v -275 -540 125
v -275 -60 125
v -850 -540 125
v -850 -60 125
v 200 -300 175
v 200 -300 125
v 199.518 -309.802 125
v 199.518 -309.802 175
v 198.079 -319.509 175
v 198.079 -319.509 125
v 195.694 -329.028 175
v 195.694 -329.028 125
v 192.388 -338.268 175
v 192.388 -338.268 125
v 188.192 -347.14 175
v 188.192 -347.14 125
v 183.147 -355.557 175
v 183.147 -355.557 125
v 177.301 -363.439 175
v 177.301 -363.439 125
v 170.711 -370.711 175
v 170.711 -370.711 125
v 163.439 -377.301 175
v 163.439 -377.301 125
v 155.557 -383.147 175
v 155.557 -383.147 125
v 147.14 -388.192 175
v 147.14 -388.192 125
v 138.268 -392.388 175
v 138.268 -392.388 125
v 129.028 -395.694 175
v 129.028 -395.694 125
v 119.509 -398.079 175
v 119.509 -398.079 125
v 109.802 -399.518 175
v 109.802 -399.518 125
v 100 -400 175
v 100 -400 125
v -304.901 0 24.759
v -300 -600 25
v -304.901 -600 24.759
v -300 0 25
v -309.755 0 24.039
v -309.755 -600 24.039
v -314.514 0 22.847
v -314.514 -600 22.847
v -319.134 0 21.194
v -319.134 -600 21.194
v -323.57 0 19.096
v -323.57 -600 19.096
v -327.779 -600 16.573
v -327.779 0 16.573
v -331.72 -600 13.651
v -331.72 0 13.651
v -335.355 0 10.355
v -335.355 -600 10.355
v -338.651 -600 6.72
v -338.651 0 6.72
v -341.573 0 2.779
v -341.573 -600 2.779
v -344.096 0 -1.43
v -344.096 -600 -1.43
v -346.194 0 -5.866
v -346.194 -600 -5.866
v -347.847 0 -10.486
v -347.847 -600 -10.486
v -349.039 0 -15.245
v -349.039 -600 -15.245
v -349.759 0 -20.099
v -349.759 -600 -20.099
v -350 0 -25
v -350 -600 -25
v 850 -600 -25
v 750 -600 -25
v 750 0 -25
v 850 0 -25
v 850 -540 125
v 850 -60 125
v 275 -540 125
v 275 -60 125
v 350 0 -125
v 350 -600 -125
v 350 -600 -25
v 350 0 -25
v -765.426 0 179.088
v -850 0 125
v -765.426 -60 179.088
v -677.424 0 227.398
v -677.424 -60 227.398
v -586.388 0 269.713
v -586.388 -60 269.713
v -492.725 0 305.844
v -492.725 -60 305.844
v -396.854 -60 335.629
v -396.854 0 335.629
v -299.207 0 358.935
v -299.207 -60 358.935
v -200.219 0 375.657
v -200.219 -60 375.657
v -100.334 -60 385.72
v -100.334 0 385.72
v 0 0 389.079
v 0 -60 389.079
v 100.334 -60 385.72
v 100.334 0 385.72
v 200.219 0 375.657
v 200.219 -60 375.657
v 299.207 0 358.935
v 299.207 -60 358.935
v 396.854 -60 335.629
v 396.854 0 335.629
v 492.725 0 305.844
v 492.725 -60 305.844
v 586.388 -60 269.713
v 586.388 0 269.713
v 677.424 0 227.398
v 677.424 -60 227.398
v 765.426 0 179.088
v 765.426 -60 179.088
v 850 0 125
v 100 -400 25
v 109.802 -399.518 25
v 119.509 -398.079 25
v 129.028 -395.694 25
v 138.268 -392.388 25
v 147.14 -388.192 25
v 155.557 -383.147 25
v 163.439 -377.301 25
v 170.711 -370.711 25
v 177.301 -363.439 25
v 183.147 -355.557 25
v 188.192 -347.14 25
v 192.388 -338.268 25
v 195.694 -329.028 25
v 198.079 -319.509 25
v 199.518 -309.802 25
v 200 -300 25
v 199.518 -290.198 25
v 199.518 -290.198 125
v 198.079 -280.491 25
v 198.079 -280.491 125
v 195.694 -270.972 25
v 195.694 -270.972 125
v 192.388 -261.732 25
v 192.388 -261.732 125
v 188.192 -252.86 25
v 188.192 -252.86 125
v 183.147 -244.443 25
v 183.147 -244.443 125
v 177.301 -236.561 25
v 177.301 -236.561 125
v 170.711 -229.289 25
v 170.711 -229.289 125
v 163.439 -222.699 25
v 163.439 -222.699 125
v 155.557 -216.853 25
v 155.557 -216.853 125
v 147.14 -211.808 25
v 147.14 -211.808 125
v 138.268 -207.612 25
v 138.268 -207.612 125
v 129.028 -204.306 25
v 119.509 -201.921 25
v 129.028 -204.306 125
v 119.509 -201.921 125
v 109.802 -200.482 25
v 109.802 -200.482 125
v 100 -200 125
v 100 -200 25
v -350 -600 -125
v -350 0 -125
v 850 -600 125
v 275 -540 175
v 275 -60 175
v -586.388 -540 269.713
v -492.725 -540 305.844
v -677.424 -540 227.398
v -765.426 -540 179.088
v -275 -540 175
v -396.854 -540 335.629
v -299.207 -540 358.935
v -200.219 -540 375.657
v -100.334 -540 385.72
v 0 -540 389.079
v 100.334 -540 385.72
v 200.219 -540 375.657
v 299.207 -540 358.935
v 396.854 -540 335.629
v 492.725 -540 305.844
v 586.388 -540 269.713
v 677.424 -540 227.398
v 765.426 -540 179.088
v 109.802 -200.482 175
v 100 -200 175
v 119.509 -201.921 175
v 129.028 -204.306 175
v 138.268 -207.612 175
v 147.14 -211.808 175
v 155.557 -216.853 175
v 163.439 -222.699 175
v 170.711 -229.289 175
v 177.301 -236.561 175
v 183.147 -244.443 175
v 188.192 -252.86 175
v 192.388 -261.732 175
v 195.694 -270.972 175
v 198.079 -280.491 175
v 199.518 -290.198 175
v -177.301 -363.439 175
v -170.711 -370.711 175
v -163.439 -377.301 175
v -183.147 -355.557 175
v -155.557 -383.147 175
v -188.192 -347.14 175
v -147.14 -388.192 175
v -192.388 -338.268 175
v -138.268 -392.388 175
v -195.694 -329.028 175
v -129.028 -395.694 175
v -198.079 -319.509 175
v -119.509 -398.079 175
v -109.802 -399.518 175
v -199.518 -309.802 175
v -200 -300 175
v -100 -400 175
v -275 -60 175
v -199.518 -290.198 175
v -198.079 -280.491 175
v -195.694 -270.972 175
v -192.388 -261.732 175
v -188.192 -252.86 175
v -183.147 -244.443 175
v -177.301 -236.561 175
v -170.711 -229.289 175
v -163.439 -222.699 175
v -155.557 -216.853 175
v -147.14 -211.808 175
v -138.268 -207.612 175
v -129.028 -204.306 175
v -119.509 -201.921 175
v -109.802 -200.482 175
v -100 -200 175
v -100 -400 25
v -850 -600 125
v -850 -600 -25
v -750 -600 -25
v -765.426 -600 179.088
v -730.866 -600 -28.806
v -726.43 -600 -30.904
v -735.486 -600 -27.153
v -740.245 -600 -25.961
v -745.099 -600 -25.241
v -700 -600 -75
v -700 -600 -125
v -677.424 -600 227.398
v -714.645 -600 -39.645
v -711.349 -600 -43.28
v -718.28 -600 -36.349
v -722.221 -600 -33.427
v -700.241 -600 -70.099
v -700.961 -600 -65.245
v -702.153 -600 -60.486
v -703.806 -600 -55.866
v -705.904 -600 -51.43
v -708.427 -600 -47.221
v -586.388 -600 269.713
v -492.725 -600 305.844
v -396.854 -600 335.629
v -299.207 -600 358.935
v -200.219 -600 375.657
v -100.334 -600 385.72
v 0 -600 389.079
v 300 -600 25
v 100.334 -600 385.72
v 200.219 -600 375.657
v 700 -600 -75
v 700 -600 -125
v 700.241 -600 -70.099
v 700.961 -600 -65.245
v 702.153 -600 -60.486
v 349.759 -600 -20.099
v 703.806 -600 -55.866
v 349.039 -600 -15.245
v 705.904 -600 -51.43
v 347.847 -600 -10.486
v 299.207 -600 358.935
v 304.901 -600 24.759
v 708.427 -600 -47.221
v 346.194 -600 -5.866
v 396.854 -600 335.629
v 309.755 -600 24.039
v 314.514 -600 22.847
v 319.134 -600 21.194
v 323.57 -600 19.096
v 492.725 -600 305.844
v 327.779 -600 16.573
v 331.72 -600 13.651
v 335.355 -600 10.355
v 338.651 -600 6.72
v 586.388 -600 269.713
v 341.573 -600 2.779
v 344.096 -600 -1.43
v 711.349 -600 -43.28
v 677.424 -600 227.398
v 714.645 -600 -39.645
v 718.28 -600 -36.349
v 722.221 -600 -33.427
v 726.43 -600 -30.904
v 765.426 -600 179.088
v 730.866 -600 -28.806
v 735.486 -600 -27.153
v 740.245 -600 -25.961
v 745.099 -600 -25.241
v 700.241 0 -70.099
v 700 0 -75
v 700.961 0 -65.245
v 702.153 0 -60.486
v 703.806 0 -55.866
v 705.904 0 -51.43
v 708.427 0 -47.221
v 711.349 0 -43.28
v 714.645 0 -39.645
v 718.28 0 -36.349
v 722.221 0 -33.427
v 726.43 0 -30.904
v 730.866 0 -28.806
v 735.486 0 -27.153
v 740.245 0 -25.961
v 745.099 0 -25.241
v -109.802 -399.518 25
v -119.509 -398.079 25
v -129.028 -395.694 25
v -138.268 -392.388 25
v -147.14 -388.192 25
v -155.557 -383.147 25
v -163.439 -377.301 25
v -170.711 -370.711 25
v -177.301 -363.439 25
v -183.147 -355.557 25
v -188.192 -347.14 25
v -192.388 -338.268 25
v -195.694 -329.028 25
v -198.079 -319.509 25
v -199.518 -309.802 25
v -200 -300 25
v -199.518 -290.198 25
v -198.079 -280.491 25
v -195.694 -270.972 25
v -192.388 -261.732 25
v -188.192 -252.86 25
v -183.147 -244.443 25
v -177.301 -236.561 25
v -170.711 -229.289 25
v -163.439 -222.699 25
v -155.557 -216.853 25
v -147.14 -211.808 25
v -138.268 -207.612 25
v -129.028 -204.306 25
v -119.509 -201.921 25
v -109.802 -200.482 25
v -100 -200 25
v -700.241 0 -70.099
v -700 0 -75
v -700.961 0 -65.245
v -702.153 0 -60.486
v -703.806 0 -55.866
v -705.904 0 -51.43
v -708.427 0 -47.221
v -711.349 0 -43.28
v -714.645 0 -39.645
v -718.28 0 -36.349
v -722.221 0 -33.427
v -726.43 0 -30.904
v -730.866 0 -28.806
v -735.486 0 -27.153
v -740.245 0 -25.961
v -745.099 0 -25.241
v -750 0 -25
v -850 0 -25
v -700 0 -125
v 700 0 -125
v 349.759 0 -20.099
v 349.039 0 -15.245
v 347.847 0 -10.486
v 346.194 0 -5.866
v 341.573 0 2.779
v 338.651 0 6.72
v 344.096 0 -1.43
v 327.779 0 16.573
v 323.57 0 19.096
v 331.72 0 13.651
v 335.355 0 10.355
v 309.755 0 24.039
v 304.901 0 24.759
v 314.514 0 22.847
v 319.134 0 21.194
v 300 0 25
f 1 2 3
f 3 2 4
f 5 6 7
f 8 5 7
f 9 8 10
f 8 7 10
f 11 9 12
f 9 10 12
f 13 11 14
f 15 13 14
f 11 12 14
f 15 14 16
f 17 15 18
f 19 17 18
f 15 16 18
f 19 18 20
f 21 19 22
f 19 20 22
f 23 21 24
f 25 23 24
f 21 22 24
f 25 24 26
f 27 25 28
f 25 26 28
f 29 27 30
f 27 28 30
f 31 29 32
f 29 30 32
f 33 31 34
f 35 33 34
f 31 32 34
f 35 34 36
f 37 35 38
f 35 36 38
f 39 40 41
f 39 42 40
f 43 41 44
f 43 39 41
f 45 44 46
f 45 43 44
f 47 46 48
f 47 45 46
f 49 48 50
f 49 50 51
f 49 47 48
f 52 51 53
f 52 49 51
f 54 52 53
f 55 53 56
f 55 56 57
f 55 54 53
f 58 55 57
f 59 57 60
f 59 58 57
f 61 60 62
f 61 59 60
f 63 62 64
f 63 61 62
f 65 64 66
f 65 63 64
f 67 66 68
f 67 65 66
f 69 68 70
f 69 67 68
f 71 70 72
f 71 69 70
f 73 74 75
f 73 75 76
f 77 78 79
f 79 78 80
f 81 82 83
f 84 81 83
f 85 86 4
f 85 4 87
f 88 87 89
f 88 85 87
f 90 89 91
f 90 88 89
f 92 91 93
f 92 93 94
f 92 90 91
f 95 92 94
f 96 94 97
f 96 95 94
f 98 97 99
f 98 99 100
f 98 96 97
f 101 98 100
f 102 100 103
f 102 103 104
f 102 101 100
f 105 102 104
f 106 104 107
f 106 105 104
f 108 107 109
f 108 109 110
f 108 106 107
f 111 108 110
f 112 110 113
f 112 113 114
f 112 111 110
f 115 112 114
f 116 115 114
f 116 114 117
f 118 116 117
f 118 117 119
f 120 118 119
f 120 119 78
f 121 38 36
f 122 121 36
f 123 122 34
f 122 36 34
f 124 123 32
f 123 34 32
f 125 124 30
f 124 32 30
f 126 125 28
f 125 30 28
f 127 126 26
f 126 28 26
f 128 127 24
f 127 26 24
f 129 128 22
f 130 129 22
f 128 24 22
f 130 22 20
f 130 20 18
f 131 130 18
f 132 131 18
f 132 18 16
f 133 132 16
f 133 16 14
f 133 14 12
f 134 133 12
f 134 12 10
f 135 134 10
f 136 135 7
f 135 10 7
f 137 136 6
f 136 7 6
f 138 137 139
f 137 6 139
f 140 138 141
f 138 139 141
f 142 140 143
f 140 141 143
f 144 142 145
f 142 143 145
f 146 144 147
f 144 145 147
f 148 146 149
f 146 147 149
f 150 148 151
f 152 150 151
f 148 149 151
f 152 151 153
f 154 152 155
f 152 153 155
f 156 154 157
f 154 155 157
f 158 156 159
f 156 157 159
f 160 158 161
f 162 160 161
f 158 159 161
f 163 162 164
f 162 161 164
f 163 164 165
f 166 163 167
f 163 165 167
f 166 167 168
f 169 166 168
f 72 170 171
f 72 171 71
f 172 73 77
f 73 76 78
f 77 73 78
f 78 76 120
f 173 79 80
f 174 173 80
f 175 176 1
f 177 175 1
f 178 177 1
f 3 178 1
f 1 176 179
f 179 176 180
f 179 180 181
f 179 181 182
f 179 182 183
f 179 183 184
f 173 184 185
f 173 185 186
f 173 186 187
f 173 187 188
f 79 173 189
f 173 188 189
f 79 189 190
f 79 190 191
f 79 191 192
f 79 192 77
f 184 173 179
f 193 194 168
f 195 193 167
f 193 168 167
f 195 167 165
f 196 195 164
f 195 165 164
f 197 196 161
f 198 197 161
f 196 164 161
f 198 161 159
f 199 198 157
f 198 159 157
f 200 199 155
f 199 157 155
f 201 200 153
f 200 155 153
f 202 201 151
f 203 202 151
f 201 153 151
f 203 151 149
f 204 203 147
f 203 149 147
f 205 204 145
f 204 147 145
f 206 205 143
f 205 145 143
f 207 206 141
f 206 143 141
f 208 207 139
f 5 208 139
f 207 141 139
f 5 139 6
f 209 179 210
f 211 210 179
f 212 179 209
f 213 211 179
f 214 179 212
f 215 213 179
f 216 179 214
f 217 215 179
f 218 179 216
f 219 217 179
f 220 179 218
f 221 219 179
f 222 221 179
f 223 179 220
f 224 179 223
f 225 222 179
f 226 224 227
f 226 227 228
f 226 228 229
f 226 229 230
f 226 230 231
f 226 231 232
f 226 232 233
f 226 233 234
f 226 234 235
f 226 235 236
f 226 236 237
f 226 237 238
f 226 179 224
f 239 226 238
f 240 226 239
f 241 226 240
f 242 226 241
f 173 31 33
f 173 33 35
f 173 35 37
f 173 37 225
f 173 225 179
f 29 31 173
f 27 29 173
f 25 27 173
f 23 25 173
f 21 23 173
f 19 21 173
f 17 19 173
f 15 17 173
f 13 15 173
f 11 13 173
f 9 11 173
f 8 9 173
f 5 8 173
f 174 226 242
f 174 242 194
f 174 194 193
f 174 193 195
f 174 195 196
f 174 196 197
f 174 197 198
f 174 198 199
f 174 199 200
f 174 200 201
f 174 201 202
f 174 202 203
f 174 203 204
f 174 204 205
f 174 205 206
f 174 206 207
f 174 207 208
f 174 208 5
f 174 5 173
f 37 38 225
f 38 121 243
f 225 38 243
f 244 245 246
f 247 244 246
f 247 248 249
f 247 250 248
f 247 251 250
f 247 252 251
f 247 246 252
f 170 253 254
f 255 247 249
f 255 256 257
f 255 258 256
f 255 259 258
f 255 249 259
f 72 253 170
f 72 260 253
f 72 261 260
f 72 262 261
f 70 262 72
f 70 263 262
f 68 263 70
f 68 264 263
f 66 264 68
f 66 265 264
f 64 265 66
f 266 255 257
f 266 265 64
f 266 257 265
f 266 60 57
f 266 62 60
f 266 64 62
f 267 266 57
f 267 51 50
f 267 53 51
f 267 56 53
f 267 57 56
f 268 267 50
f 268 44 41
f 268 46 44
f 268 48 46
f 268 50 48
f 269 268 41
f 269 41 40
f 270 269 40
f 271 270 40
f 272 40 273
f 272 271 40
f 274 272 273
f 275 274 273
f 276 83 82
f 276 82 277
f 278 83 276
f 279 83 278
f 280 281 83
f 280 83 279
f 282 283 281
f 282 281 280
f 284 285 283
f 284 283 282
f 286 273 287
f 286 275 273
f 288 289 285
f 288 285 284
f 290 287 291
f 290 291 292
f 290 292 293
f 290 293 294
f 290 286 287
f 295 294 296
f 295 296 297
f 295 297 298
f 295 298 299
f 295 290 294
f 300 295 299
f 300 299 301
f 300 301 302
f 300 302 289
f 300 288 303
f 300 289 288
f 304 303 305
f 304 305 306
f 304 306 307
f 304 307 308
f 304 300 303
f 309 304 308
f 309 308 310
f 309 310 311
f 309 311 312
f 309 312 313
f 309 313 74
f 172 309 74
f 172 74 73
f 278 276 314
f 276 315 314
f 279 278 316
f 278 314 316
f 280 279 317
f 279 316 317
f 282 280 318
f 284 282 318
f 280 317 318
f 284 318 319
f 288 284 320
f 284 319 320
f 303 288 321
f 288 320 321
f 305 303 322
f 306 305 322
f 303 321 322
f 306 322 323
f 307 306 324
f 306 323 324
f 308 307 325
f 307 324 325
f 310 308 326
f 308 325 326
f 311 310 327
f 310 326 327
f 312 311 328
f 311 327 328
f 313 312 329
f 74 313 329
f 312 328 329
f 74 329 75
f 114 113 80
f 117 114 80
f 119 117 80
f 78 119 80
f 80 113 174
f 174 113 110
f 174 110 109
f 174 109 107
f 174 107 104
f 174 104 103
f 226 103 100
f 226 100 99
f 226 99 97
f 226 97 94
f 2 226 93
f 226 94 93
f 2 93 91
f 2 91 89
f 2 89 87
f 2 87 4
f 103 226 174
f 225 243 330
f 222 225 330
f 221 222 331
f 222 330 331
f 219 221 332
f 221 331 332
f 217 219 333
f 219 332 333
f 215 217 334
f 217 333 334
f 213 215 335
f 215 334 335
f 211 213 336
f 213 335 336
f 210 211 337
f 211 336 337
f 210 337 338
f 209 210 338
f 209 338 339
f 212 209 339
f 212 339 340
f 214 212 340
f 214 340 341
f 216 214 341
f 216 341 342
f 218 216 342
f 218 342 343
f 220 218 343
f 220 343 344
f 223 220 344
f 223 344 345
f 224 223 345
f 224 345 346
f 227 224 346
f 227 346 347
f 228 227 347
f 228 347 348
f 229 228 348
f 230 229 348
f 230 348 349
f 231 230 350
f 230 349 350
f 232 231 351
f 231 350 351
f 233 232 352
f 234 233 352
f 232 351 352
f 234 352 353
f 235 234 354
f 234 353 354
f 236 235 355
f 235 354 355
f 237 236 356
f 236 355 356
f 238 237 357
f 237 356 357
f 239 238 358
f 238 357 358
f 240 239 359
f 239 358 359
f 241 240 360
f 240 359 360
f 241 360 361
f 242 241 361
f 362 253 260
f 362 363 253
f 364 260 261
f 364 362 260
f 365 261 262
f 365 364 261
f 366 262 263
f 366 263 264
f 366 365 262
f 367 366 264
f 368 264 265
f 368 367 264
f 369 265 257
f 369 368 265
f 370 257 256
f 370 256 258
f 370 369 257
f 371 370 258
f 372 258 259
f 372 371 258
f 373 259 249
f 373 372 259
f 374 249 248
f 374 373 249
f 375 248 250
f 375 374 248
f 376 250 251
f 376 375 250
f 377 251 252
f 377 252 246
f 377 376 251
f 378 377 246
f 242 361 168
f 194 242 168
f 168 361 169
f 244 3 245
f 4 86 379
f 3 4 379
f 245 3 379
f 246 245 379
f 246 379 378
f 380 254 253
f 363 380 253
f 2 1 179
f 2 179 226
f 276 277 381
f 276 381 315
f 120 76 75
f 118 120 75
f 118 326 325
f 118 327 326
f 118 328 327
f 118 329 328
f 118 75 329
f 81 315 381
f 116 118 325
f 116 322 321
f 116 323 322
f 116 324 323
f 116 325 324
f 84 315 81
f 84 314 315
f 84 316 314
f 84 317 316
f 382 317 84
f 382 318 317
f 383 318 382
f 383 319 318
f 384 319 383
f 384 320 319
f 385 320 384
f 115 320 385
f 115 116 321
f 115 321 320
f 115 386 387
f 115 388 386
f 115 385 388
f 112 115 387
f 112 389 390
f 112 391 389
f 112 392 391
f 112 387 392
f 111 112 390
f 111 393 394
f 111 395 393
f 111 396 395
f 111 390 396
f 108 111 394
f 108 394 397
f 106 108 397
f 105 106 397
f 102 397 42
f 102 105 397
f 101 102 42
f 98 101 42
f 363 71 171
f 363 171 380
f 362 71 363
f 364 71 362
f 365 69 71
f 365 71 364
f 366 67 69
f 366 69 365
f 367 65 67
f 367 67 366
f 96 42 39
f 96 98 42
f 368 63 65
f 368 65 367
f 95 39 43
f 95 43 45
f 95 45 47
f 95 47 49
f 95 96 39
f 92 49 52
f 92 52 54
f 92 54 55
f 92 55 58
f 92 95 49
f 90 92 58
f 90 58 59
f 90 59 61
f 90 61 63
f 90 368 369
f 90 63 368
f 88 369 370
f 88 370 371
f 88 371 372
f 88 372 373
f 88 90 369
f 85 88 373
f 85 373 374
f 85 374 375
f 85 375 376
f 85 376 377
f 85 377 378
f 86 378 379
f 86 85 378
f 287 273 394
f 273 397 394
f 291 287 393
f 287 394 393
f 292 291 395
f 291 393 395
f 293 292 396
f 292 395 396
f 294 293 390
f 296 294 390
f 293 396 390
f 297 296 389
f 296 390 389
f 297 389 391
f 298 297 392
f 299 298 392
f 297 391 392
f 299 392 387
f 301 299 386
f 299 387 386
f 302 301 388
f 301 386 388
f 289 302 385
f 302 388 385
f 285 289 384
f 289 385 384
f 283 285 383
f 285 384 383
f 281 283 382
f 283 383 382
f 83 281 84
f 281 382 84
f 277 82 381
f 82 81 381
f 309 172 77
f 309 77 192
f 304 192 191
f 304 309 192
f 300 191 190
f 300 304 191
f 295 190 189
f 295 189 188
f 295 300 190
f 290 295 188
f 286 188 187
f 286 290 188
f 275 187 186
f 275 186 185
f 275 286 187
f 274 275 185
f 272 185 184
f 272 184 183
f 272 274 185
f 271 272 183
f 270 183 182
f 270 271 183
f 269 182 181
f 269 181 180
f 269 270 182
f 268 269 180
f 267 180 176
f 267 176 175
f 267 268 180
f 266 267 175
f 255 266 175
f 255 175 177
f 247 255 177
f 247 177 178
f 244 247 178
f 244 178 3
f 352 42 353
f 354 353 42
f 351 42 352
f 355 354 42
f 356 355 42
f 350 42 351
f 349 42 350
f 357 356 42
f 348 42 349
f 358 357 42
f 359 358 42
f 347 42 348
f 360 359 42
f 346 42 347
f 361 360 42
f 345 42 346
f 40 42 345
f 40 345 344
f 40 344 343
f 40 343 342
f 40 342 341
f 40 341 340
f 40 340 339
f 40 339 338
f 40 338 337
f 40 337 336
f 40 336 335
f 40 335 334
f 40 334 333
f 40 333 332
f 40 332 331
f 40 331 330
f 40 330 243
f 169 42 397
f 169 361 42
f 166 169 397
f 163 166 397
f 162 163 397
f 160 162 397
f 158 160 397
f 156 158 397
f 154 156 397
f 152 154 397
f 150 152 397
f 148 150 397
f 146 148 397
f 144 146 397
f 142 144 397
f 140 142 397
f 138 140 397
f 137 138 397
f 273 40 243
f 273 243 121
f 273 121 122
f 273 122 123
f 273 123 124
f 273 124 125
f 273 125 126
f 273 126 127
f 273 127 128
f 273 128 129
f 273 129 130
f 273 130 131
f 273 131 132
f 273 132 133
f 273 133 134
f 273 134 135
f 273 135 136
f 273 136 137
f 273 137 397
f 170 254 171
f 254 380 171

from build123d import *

# Parameters (mm, degrees)
F0_W      = 150
F0_H      = 100
F1_DEPTH  = 600
F2_W      = 150
F2_H      = 100
F3_DEPTH  = 600.001
F4_W      = 150
F4_H      = 100
F5_DEPTH  = 600.001
F6_R      = 50
F7_R      = 50
F9_DEPTH  = 60
F11_DEPTH = 60
F12_W     = 700
F12_H     = 300
F13_DEPTH = 600.001
F14_R     = 50
F15_R     = 50
F16_W     = 550
F16_H     = 480
F17_DEPTH = 50
F18_DEPTH = 25
F19_DEPTH = 250.001


with BuildPart() as f1:
    # F0 (on Front) → F1 (new body)
    with BuildSketch(Plane.XZ):
        with Locations((-775, -75)):
            Rectangle(F0_W, F0_H)
        Polygon((-700, -25), (-700, -125), (850, -125), (850, 125), (-850, 125), (-850, -25), align=None)
    extrude(amount=F1_DEPTH)

    # F2 (on face) → F3 (cut, through all)
    with BuildSketch(Plane.XZ.offset(600)):
        with Locations((-775, -75)):
            Rectangle(F2_W, F2_H)
    extrude(amount=-F3_DEPTH, mode=Mode.SUBTRACT)

    # F4 (on face) → F5 (cut, through all)
    with BuildSketch(Plane.XZ.offset(600)):
        with Locations((775, -75)):
            Rectangle(F4_W, F4_H)
    extrude(amount=-F5_DEPTH, mode=Mode.SUBTRACT)

    # F6
    f6_edges = [f1.edges().sort_by_distance(p)[0] for p in [
        (-700, -300, -25),
    ]]
    fillet(f6_edges, radius=F6_R)

    # F7
    f7_edges = [f1.edges().sort_by_distance(p)[0] for p in [
        (700, -300, -25),
    ]]
    fillet(f7_edges, radius=F7_R)

    # F8 (on face) → F9 (join)
    with BuildSketch(Plane(origin=(0, 0, 0), x_dir=(-1, 0, 0), z_dir=(0, 1, 0))):
        with BuildLine():
            Line((-850, 125), (850, 125))
            ThreePointArc((850, 125), (0, 389.079291), (-850, 125))
        make_face()
    extrude(amount=-F9_DEPTH)

    # F10 (on face) → F11 (join)
    with BuildSketch(Plane.XZ.offset(600)):
        with BuildLine():
            Line((850, -25), (850, 125))
            ThreePointArc((850, 125), (0, 389.079291), (-850, 125))
            Line((-850, 125), (-850, -25))
            Line((-850, -25), (-750, -25))
            ThreePointArc((-750, -25), (-714.644661, -39.644661), (-700, -75))
            Line((-700, -75), (-700, -125))
            Line((-700, -125), (700, -125))
            Line((700, -125), (700, -75))
            ThreePointArc((700, -75), (714.644661, -39.644661), (750, -25))
            Line((750, -25), (850, -25))
        make_face()
    extrude(amount=-F11_DEPTH)

    # F12 (on face) → F13 (cut, through all)
    with BuildSketch(Plane.XZ.offset(600)):
        with Locations((0, -125)):
            Rectangle(F12_W, F12_H)
    extrude(amount=-F13_DEPTH, mode=Mode.SUBTRACT)

    # F14
    f14_edges = [f1.edges().sort_by_distance(p)[0] for p in [
        (350, -300, 25),
    ]]
    fillet(f14_edges, radius=F14_R)

    # F15
    f15_edges = [f1.edges().sort_by_distance(p)[0] for p in [
        (-350, -300, 25),
    ]]
    fillet(f15_edges, radius=F15_R)

    # F16 (on face) → F17 (join)
    with BuildSketch(Plane.XY.offset(125)):
        with Locations((0, -300)):
            Rectangle(F16_W, F16_H)
        with BuildLine():
            Line((100, -400), (-100, -400))
            ThreePointArc((-100, -400), (-200, -300), (-100, -200))
            Line((-100, -200), (100, -200))
            ThreePointArc((100, -200), (170.710678, -229.289322), (200, -300))
            ThreePointArc((200, -300), (170.710678, -370.710678), (100, -400))
        make_face(mode=Mode.SUBTRACT)
    extrude(amount=F17_DEPTH)

    # F16 (on face) → F18 (join)
    with BuildSketch(Plane.XY.offset(125)):
        with Locations((0, -300)):
            Rectangle(F16_W, F16_H)
        with BuildLine():
            Line((100, -400), (-100, -400))
            ThreePointArc((-100, -400), (-200, -300), (-100, -200))
            Line((-100, -200), (100, -200))
            ThreePointArc((100, -200), (170.710678, -229.289322), (200, -300))
            ThreePointArc((200, -300), (170.710678, -370.710678), (100, -400))
        make_face(mode=Mode.SUBTRACT)
    extrude(amount=F18_DEPTH)

    # F17_face (on face) → F19 (cut, through all)
    with BuildSketch(Plane(origin=(0, -300, 125), x_dir=(1, 0, 0), z_dir=(0, 0, 1))):
        with BuildLine():
            Line((100, 100), (-100, 100))
            ThreePointArc((-100, 100), (-200, 0), (-100, -100))
            Line((-100, -100), (100, -100))
            ThreePointArc((100, -100), (200, 0), (100, 100))
        make_face()
    extrude(amount=-F19_DEPTH, mode=Mode.SUBTRACT)


solid = f1.part
